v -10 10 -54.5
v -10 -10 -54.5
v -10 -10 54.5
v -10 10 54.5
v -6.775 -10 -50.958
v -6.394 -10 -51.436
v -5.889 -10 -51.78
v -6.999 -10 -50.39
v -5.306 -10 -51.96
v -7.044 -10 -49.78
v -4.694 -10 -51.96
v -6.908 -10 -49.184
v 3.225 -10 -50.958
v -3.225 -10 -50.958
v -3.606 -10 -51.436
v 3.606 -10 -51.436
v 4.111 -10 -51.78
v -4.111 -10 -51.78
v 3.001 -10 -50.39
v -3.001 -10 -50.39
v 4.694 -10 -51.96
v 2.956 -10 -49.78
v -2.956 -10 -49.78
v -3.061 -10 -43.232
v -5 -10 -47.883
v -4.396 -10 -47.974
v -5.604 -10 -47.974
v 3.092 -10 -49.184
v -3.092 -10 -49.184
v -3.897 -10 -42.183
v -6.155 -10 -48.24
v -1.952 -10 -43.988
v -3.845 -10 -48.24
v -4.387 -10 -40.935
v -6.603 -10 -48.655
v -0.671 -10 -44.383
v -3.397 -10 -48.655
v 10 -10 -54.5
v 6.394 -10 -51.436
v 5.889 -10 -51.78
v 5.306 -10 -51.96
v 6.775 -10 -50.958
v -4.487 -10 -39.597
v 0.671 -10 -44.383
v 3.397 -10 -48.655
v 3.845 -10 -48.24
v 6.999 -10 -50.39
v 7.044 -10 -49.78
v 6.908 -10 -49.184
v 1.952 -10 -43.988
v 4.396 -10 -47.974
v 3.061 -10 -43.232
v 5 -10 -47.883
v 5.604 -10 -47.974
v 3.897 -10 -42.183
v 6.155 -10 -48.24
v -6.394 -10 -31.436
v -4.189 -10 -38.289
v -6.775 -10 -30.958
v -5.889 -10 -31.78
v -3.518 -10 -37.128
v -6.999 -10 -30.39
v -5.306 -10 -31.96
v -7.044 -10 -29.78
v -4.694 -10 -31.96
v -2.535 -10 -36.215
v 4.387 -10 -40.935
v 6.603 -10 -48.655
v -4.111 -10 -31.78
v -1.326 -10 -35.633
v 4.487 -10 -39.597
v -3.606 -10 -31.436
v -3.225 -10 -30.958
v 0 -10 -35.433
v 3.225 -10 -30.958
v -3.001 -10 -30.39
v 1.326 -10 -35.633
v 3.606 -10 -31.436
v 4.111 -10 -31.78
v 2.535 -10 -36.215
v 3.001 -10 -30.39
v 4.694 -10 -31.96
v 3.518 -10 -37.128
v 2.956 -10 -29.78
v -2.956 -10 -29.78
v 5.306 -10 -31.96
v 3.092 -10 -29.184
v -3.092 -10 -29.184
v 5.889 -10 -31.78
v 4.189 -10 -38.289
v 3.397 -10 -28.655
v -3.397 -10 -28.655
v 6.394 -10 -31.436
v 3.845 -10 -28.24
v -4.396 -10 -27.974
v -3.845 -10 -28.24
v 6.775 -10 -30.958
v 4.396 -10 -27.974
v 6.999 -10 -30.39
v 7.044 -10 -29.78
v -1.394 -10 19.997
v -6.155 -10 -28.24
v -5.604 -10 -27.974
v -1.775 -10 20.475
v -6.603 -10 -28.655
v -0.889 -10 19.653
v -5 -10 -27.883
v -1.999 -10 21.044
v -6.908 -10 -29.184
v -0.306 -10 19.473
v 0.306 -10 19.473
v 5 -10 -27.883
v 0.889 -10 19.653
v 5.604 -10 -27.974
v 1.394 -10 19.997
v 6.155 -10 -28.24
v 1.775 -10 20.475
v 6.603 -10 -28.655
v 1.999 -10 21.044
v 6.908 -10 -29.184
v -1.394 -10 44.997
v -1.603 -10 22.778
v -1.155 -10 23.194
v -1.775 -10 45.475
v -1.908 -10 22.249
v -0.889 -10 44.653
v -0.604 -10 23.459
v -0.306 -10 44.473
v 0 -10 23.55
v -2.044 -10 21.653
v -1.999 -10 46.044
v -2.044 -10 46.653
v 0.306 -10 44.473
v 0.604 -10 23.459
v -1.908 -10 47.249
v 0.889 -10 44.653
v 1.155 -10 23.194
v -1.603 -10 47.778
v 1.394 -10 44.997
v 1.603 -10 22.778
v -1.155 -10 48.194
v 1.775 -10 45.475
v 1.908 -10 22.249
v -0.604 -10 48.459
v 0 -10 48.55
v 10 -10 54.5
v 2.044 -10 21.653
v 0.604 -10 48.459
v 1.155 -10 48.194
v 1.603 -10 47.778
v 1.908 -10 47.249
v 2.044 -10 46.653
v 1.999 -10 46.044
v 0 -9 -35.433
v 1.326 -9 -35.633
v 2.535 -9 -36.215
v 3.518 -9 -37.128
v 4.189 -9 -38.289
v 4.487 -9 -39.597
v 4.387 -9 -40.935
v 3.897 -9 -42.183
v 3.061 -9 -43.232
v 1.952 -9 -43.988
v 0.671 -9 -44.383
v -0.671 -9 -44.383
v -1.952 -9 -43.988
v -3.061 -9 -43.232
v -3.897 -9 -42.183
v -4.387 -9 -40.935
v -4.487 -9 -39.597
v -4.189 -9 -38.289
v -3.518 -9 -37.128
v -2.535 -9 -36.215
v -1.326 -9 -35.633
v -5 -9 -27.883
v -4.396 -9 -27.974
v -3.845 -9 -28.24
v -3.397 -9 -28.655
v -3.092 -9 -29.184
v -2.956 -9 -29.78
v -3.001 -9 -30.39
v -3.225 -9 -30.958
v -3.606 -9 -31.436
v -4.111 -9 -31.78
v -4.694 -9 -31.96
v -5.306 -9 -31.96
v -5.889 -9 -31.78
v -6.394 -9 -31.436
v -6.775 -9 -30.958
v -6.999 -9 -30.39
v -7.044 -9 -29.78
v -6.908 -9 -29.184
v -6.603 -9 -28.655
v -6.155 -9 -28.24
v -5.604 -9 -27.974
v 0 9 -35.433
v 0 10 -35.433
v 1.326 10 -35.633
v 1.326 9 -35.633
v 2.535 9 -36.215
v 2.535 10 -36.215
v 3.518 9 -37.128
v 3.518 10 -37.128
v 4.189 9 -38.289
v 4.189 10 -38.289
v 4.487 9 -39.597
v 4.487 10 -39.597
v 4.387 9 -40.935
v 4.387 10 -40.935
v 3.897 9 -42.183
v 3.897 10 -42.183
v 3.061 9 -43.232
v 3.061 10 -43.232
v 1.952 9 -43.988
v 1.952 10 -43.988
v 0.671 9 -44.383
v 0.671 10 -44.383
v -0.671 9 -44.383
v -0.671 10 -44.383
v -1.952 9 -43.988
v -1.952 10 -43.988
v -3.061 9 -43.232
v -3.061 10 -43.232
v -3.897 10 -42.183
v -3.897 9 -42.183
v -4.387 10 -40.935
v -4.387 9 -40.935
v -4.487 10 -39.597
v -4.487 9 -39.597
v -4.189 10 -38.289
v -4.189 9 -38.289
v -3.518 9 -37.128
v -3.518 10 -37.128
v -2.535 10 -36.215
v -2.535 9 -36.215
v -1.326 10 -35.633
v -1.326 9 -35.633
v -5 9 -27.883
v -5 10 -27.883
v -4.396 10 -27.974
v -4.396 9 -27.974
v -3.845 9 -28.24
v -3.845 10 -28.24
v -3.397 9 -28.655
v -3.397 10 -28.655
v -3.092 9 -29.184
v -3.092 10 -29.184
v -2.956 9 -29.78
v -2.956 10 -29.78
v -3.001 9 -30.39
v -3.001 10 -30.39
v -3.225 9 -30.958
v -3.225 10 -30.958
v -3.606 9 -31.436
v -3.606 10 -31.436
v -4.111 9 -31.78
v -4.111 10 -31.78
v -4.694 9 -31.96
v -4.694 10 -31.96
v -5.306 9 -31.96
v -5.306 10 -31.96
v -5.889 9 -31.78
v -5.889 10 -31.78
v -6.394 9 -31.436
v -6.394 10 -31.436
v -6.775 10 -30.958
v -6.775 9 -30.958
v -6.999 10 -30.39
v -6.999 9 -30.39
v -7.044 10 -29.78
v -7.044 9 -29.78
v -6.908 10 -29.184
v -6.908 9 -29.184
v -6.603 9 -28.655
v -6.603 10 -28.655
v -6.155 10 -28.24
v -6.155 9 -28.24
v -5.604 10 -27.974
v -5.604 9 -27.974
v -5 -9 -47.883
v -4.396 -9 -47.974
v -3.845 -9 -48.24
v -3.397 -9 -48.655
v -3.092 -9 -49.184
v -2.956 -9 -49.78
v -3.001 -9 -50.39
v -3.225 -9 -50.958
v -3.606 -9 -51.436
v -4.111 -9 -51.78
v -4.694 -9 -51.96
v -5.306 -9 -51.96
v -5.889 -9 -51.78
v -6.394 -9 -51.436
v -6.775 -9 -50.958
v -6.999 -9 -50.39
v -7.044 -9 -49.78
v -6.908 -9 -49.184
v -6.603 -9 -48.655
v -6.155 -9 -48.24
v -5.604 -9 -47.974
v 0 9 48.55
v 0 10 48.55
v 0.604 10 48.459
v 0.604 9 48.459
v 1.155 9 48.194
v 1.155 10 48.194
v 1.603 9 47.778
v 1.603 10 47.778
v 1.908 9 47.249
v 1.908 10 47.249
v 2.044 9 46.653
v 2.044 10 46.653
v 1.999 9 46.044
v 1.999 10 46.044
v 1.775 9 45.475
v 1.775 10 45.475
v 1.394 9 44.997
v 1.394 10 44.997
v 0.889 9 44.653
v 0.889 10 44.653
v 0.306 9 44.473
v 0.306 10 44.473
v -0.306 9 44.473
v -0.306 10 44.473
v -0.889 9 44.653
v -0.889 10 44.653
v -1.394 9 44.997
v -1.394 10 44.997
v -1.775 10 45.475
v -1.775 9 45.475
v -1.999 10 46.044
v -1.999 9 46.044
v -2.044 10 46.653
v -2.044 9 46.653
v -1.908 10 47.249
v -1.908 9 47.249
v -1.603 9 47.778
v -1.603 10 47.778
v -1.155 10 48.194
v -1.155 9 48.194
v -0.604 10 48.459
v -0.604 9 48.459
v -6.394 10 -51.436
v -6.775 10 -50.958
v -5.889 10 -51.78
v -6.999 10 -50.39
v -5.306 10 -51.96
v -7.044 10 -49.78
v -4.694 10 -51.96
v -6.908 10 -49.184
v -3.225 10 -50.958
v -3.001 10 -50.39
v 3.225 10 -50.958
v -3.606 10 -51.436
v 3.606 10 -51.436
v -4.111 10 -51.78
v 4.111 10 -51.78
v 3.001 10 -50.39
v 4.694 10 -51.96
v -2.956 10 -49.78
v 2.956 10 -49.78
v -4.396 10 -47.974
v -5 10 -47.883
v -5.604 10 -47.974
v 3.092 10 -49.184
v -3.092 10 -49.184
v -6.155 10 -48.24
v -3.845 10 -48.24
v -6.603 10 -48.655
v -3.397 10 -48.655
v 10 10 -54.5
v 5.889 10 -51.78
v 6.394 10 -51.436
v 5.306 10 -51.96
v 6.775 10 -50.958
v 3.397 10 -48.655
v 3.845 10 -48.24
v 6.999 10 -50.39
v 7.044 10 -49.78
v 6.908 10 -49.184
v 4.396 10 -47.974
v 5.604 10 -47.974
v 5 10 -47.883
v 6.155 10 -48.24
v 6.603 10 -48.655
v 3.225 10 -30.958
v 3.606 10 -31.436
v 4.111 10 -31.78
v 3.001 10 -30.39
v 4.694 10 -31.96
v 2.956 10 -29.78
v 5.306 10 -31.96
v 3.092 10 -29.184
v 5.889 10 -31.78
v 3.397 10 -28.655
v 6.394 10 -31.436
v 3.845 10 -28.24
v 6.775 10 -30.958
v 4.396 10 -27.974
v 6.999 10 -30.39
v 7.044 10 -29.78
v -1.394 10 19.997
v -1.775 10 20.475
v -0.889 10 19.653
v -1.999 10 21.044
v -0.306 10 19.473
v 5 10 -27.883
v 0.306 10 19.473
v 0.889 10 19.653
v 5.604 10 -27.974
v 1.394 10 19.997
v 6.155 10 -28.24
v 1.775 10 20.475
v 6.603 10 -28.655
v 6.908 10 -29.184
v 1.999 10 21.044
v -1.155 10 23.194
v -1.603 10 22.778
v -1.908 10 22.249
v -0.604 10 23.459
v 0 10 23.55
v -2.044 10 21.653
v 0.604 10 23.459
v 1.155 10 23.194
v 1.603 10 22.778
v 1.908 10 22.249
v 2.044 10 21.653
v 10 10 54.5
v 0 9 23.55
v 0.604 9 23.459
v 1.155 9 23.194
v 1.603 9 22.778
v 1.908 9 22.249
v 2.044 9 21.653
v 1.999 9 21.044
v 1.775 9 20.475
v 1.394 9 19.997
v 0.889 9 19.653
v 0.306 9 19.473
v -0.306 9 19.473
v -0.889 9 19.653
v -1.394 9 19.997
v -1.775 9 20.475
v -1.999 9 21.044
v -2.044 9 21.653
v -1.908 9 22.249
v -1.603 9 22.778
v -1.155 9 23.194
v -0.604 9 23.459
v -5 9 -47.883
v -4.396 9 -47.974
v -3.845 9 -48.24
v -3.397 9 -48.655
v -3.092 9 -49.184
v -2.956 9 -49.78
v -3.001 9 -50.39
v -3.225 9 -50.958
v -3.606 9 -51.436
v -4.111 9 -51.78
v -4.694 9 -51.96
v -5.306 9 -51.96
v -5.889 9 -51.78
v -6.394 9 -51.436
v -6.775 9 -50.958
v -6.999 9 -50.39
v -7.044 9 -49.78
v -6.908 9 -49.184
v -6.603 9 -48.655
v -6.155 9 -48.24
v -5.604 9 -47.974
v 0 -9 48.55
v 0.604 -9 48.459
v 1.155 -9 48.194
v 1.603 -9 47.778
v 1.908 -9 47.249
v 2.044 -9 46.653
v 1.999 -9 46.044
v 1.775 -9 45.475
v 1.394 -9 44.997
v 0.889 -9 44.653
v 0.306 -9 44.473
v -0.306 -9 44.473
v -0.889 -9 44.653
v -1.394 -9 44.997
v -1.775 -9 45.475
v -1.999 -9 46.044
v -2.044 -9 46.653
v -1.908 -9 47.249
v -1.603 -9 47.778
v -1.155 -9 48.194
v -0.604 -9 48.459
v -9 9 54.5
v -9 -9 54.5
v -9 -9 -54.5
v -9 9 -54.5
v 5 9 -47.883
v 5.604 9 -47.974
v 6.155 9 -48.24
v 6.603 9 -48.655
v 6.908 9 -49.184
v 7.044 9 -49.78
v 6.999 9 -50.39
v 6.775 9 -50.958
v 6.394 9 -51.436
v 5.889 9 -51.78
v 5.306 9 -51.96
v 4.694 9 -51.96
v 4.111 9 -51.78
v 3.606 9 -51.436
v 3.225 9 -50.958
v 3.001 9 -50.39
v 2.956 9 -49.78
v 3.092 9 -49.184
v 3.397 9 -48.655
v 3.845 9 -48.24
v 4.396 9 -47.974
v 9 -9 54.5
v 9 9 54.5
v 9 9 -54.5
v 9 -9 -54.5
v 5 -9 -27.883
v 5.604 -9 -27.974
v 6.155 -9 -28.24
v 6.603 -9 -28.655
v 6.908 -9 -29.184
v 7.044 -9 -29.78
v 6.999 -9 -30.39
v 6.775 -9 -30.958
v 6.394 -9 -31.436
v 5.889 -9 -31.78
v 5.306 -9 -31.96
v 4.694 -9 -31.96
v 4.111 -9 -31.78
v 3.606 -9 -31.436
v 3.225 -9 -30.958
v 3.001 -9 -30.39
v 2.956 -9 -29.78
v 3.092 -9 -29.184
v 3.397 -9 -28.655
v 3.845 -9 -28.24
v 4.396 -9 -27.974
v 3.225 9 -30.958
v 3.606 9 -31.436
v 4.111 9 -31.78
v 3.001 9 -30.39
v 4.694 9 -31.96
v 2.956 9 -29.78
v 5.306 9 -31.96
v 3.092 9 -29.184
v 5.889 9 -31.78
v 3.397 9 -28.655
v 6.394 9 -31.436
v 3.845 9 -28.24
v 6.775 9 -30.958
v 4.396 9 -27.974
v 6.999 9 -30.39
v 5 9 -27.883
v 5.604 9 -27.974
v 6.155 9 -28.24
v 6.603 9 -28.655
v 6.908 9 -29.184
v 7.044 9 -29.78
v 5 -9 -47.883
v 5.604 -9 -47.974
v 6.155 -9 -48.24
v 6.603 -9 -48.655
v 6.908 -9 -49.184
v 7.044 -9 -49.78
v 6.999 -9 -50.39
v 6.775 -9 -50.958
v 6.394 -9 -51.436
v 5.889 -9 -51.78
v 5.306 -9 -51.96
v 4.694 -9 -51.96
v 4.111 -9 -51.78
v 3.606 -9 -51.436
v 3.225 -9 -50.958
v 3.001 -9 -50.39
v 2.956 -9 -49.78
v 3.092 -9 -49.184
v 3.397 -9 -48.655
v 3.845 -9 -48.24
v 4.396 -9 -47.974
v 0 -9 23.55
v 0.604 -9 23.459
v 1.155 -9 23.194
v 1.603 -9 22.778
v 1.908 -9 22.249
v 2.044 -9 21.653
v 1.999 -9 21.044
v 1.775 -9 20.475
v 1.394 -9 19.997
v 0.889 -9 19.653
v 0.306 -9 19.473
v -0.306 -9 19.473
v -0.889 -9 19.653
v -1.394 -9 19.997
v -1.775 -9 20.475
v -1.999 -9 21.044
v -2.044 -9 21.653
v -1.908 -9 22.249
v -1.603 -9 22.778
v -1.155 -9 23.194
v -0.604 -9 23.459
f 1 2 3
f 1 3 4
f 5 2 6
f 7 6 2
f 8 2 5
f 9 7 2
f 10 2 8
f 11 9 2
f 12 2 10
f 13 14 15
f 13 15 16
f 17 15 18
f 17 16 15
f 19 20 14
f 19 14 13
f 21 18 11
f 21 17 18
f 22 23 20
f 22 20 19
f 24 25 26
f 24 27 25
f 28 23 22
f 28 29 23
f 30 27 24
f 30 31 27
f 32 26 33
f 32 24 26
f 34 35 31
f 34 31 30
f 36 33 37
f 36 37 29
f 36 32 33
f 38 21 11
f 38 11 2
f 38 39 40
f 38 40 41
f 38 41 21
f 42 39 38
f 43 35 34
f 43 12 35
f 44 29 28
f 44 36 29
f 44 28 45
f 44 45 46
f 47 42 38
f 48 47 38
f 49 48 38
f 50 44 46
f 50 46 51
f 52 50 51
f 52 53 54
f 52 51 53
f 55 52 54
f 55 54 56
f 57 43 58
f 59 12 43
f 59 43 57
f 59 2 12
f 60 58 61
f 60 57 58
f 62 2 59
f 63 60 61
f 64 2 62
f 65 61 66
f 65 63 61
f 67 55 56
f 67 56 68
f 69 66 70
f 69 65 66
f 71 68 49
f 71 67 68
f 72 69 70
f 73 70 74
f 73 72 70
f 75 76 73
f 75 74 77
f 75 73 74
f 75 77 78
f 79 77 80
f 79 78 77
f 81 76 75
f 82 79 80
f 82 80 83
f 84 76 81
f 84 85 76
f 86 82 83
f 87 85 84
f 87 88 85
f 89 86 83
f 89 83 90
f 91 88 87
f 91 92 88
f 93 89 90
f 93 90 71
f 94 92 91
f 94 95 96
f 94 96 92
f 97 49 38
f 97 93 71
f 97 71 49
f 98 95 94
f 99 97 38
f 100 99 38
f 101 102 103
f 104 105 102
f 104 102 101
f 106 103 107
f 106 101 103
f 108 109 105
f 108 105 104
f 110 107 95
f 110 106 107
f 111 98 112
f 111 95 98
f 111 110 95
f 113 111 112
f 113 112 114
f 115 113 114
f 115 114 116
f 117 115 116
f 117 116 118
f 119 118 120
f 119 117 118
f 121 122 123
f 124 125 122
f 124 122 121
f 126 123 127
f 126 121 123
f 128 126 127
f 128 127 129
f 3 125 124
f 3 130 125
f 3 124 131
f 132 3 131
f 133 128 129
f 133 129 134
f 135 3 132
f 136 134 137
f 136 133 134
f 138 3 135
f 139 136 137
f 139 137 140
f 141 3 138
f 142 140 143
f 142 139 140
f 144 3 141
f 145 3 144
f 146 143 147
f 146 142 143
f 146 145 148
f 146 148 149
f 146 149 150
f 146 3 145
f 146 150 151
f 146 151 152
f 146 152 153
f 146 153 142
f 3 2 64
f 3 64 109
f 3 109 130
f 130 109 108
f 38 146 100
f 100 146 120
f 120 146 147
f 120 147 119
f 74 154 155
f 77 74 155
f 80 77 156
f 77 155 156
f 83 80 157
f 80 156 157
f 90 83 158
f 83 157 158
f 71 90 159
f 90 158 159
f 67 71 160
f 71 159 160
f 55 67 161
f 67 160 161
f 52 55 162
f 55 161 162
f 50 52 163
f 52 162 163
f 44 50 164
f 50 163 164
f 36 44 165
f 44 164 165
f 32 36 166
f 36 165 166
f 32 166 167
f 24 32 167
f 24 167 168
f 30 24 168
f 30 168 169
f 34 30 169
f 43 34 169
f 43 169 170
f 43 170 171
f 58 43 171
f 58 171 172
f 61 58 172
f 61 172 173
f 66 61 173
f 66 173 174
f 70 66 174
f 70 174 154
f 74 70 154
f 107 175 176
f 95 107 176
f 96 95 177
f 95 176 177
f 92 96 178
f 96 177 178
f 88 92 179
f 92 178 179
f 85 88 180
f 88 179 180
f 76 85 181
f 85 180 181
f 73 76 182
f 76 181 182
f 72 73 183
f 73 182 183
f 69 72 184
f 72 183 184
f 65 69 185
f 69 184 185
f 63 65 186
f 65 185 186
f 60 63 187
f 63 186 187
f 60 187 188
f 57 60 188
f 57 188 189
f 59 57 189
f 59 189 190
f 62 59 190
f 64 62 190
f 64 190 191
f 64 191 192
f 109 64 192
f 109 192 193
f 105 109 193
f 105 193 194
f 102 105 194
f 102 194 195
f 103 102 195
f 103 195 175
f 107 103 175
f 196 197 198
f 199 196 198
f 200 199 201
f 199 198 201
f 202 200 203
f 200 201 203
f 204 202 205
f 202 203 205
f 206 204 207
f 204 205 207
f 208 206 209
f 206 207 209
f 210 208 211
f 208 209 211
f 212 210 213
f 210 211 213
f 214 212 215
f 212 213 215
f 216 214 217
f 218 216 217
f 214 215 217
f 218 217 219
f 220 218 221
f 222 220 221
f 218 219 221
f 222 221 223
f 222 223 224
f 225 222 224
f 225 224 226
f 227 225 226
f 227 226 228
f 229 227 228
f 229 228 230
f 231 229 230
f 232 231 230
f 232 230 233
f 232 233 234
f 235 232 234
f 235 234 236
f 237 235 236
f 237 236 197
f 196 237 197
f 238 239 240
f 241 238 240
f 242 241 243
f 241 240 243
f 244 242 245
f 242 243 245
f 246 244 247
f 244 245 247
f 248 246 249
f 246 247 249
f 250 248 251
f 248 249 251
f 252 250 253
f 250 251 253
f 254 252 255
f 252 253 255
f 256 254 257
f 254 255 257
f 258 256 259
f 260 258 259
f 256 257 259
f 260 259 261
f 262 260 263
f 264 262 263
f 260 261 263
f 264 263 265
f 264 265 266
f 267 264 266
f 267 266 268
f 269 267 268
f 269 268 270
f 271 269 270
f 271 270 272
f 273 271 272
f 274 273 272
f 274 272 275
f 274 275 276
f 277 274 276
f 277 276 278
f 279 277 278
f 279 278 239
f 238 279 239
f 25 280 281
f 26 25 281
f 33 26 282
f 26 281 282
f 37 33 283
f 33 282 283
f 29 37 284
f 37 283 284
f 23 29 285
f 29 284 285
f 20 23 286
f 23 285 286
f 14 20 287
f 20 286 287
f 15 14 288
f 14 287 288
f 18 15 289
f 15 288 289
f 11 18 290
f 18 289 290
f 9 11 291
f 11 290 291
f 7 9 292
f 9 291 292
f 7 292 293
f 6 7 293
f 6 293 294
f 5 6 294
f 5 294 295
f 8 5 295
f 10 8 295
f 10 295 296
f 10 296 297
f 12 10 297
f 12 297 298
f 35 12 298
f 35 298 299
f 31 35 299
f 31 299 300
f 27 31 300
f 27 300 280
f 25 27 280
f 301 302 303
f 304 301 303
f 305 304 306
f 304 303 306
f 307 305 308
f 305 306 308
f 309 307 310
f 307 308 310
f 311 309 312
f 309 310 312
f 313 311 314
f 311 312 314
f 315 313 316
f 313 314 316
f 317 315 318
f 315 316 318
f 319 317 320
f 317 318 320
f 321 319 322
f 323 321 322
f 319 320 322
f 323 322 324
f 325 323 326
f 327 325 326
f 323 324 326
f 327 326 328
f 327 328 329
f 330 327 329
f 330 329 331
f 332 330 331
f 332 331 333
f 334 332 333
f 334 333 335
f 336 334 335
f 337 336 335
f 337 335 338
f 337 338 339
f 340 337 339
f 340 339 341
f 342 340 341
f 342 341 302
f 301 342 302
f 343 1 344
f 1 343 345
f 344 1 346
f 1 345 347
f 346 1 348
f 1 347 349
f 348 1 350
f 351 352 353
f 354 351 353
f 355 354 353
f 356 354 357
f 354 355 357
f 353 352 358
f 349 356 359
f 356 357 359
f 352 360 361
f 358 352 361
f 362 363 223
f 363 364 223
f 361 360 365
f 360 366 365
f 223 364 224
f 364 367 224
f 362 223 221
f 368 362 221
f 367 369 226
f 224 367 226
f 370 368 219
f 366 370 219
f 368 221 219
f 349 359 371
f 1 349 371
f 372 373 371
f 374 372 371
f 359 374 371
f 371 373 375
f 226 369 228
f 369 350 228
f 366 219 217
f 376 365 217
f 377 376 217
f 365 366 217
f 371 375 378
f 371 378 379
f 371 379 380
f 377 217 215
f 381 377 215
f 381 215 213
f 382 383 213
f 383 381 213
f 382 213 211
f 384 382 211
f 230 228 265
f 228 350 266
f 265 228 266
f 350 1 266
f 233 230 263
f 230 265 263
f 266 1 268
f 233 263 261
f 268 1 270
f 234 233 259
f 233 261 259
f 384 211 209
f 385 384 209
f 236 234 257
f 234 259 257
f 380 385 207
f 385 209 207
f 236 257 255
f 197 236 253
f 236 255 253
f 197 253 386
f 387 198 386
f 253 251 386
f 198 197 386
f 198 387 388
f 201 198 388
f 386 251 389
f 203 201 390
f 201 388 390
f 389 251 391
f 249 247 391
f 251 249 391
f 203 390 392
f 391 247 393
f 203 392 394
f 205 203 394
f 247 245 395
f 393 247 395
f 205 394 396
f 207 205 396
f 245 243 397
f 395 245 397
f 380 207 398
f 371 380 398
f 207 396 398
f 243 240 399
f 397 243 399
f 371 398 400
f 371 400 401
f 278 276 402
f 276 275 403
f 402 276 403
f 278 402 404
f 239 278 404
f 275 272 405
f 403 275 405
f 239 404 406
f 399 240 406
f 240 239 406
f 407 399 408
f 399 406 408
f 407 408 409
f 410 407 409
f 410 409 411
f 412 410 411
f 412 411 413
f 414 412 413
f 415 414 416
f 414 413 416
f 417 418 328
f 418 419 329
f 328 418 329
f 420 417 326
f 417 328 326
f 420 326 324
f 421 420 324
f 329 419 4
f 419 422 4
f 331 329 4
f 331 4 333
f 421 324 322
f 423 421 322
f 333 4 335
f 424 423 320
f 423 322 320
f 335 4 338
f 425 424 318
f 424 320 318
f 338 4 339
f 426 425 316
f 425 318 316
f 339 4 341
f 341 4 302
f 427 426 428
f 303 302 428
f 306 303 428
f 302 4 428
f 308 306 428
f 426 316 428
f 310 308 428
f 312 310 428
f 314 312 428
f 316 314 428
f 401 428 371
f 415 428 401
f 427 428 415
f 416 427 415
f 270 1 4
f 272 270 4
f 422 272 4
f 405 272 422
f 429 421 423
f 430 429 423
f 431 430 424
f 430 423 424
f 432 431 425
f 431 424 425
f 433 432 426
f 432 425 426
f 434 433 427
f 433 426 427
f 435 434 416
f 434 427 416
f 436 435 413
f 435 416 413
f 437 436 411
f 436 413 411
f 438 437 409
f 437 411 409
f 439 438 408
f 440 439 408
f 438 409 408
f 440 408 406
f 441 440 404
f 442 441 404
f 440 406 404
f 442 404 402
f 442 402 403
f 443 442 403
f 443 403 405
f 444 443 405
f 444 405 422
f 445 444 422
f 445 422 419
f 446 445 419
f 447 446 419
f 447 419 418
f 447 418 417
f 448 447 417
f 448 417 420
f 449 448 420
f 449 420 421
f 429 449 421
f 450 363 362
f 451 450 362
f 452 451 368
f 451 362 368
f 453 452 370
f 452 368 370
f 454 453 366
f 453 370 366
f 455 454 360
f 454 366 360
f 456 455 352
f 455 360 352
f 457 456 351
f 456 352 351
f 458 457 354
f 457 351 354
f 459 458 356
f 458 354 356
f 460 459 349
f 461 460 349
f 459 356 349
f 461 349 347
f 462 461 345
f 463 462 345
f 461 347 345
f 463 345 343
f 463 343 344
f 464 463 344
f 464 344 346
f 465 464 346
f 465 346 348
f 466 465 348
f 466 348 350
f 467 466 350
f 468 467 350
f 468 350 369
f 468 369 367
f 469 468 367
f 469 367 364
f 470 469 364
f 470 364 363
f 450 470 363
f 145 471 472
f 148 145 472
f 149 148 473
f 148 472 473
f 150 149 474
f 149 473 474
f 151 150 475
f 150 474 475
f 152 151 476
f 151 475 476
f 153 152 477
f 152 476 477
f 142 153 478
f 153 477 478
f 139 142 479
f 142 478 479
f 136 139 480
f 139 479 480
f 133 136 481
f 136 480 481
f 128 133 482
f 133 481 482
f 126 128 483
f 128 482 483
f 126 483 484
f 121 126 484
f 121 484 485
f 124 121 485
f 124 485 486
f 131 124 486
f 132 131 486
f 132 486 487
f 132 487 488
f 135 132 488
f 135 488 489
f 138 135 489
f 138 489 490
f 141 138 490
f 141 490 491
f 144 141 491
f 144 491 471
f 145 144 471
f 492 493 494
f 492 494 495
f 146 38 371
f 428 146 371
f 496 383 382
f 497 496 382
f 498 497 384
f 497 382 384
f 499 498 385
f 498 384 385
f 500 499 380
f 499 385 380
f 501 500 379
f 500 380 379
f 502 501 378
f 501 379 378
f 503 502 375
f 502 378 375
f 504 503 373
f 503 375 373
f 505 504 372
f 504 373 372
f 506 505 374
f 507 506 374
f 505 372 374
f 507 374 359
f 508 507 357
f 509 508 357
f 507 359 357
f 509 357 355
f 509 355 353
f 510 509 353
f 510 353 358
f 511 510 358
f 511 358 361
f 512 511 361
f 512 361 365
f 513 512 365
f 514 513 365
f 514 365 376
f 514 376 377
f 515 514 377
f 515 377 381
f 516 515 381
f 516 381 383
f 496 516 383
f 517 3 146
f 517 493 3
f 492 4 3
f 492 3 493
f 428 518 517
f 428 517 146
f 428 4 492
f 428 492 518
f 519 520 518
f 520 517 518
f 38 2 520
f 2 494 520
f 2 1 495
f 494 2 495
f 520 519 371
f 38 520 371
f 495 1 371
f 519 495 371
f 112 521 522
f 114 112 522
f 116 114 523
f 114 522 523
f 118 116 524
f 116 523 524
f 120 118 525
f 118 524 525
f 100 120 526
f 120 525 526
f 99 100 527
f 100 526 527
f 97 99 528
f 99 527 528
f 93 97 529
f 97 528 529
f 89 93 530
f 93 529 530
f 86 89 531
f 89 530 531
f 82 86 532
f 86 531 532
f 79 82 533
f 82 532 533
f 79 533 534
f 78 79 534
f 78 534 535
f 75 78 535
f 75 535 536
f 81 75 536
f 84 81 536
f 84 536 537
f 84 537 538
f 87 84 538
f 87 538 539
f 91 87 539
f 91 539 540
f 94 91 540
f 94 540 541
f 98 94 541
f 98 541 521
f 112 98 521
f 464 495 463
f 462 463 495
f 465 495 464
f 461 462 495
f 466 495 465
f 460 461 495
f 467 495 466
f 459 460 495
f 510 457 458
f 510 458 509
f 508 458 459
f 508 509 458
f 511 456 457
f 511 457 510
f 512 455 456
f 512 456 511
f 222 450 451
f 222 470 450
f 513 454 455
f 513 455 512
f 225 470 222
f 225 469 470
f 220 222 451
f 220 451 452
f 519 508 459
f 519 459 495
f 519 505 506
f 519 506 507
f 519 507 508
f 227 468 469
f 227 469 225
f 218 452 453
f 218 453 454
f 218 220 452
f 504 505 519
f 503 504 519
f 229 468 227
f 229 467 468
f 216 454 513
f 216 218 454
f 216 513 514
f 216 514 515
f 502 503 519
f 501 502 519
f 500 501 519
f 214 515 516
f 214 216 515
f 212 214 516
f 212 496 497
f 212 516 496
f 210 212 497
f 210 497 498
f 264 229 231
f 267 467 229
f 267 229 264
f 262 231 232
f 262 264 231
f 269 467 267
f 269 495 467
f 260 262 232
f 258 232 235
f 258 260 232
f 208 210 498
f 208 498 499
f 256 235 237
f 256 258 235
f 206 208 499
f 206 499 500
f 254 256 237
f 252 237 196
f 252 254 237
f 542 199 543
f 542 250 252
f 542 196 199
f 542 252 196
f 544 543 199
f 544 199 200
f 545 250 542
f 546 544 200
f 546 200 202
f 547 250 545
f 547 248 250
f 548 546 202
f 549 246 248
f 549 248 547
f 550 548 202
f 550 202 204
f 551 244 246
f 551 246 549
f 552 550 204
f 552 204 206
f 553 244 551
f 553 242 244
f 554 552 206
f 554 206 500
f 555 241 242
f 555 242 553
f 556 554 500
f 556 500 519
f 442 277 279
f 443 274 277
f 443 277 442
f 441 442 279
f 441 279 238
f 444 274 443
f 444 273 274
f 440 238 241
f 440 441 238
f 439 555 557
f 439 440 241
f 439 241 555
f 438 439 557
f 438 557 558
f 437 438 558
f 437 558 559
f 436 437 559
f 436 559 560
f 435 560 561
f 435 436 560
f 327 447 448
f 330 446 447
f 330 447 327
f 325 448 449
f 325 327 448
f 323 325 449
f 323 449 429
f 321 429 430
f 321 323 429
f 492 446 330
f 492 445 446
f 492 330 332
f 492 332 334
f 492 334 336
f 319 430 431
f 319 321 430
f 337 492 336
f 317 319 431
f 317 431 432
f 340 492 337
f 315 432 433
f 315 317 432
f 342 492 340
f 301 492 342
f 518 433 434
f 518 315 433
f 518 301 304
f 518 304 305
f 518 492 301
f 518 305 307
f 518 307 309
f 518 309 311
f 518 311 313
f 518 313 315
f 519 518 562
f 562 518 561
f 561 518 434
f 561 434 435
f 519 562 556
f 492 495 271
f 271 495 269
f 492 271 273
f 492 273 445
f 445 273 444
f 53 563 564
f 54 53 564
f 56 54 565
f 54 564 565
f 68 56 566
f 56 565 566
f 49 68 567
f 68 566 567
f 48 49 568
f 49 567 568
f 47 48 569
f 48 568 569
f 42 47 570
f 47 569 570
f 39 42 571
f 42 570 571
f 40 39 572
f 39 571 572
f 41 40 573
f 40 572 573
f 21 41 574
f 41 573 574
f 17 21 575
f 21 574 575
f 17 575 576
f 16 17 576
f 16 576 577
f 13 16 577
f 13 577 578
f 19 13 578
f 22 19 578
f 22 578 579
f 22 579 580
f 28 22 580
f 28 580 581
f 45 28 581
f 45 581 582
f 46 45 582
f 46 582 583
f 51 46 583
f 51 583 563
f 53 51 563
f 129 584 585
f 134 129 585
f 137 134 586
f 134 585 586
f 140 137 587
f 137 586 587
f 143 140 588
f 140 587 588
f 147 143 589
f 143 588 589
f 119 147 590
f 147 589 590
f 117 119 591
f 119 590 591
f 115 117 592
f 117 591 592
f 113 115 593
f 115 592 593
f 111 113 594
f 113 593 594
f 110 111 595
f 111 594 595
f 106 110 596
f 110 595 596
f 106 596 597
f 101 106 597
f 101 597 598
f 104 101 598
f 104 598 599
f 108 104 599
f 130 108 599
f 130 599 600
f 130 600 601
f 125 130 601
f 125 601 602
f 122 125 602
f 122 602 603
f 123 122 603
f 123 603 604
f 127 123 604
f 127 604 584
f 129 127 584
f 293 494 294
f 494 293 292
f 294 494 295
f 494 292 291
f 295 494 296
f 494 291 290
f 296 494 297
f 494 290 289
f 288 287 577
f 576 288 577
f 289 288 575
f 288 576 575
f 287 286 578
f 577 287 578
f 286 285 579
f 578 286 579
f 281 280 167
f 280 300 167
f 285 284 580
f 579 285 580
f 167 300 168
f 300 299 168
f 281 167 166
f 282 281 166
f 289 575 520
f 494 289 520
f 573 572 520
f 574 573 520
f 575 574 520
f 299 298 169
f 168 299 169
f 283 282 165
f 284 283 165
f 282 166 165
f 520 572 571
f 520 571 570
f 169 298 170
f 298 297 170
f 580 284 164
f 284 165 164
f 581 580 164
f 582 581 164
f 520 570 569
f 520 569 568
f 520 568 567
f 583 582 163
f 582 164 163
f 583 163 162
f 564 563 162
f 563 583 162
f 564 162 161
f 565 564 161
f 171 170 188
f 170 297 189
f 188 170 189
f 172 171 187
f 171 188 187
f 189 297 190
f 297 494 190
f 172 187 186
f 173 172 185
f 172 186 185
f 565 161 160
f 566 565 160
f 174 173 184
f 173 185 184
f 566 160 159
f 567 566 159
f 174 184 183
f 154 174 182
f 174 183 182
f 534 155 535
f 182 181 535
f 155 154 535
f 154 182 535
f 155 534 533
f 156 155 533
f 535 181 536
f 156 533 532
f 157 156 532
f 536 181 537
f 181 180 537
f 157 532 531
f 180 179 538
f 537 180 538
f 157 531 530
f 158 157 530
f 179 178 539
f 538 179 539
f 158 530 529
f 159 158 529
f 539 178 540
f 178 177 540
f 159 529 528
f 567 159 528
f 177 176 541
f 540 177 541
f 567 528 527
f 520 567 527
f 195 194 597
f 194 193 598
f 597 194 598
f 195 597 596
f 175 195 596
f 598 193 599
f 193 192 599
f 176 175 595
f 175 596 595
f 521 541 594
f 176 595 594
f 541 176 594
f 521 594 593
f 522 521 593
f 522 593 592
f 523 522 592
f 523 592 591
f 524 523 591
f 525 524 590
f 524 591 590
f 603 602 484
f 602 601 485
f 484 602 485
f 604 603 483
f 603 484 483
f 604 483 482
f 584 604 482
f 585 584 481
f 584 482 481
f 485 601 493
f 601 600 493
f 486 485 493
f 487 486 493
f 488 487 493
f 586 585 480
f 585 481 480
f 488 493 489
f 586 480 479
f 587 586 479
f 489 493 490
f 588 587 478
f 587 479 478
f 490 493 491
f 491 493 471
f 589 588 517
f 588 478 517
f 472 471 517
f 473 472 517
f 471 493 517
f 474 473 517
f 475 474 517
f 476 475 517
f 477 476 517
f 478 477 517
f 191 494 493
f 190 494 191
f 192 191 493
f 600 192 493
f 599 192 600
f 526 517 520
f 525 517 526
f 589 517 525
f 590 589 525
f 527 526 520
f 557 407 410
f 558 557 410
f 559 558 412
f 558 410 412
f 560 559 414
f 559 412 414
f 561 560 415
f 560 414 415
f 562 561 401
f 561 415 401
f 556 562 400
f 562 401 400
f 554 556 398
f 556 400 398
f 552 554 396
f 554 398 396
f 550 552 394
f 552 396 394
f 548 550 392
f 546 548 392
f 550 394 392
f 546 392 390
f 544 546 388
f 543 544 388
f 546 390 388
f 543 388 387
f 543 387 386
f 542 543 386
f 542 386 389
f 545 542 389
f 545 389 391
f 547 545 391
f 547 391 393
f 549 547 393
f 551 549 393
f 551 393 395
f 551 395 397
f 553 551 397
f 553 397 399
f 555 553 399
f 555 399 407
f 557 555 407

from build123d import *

# Parameters (mm, degrees)
SKETCH_1_2_W         = 20
SKETCH_1_2_H         = 20
SKETCH_1_2_W_2       = 18
SKETCH_1_2_H_2       = 18
EXTRUDE_2_DEPTH      = 54.5
SKETCH_2_R           = 2.05
CUT_EXTRUDE_1_DEPTH  = 102
SKETCH_11_R          = 2.05
CUT_EXTRUDE_8_DEPTH  = 50
SKETCH_17_R          = 4.5
CUT_EXTRUDE_14_DEPTH = 40


with BuildPart() as part:
    # 草图1<2> → 凸台-拉伸2 (new, symmetric)
    with BuildSketch(Plane.XY):
        Rectangle(SKETCH_1_2_W, SKETCH_1_2_H)
        Rectangle(SKETCH_1_2_W_2, SKETCH_1_2_H_2, mode=Mode.SUBTRACT)
    extrude(amount=EXTRUDE_2_DEPTH, both=True)

    # 草图2 → 切除-拉伸1 (cut)
    with BuildSketch(Plane(origin=(0, 10, 0), x_dir=(1, 0, 0), z_dir=(0, 1, 0))):
        with Locations((0, -46.5)):
            Circle(SKETCH_2_R)
        with Locations((0, -21.5)):
            Circle(SKETCH_2_R)
    extrude(amount=-CUT_EXTRUDE_1_DEPTH, mode=Mode.SUBTRACT)

    # 草图11 → 切除-拉伸8 (cut)
    with BuildSketch(Plane(origin=(0, 10, 0), x_dir=(1, 0, 0), z_dir=(0, 1, 0))):
        with Locations((5, 29.933387088)):
            Circle(SKETCH_11_R)
        with Locations((-5, 29.933387088)):
            Circle(SKETCH_11_R)
        with Locations((5, 49.933387088)):
            Circle(SKETCH_11_R)
        with Locations((-5, 49.933387088)):
            Circle(SKETCH_11_R)
    extrude(amount=-CUT_EXTRUDE_8_DEPTH, mode=Mode.SUBTRACT)

    # 草图17 → 切除-拉伸14 (cut)
    with BuildSketch(Plane(origin=(0, 10, 0), x_dir=(1, 0, 0), z_dir=(0, 1, 0))):
        with Locations((0, 39.933387088)):
            Circle(SKETCH_17_R)
    extrude(amount=-CUT_EXTRUDE_14_DEPTH, mode=Mode.SUBTRACT)


solid = part.part
